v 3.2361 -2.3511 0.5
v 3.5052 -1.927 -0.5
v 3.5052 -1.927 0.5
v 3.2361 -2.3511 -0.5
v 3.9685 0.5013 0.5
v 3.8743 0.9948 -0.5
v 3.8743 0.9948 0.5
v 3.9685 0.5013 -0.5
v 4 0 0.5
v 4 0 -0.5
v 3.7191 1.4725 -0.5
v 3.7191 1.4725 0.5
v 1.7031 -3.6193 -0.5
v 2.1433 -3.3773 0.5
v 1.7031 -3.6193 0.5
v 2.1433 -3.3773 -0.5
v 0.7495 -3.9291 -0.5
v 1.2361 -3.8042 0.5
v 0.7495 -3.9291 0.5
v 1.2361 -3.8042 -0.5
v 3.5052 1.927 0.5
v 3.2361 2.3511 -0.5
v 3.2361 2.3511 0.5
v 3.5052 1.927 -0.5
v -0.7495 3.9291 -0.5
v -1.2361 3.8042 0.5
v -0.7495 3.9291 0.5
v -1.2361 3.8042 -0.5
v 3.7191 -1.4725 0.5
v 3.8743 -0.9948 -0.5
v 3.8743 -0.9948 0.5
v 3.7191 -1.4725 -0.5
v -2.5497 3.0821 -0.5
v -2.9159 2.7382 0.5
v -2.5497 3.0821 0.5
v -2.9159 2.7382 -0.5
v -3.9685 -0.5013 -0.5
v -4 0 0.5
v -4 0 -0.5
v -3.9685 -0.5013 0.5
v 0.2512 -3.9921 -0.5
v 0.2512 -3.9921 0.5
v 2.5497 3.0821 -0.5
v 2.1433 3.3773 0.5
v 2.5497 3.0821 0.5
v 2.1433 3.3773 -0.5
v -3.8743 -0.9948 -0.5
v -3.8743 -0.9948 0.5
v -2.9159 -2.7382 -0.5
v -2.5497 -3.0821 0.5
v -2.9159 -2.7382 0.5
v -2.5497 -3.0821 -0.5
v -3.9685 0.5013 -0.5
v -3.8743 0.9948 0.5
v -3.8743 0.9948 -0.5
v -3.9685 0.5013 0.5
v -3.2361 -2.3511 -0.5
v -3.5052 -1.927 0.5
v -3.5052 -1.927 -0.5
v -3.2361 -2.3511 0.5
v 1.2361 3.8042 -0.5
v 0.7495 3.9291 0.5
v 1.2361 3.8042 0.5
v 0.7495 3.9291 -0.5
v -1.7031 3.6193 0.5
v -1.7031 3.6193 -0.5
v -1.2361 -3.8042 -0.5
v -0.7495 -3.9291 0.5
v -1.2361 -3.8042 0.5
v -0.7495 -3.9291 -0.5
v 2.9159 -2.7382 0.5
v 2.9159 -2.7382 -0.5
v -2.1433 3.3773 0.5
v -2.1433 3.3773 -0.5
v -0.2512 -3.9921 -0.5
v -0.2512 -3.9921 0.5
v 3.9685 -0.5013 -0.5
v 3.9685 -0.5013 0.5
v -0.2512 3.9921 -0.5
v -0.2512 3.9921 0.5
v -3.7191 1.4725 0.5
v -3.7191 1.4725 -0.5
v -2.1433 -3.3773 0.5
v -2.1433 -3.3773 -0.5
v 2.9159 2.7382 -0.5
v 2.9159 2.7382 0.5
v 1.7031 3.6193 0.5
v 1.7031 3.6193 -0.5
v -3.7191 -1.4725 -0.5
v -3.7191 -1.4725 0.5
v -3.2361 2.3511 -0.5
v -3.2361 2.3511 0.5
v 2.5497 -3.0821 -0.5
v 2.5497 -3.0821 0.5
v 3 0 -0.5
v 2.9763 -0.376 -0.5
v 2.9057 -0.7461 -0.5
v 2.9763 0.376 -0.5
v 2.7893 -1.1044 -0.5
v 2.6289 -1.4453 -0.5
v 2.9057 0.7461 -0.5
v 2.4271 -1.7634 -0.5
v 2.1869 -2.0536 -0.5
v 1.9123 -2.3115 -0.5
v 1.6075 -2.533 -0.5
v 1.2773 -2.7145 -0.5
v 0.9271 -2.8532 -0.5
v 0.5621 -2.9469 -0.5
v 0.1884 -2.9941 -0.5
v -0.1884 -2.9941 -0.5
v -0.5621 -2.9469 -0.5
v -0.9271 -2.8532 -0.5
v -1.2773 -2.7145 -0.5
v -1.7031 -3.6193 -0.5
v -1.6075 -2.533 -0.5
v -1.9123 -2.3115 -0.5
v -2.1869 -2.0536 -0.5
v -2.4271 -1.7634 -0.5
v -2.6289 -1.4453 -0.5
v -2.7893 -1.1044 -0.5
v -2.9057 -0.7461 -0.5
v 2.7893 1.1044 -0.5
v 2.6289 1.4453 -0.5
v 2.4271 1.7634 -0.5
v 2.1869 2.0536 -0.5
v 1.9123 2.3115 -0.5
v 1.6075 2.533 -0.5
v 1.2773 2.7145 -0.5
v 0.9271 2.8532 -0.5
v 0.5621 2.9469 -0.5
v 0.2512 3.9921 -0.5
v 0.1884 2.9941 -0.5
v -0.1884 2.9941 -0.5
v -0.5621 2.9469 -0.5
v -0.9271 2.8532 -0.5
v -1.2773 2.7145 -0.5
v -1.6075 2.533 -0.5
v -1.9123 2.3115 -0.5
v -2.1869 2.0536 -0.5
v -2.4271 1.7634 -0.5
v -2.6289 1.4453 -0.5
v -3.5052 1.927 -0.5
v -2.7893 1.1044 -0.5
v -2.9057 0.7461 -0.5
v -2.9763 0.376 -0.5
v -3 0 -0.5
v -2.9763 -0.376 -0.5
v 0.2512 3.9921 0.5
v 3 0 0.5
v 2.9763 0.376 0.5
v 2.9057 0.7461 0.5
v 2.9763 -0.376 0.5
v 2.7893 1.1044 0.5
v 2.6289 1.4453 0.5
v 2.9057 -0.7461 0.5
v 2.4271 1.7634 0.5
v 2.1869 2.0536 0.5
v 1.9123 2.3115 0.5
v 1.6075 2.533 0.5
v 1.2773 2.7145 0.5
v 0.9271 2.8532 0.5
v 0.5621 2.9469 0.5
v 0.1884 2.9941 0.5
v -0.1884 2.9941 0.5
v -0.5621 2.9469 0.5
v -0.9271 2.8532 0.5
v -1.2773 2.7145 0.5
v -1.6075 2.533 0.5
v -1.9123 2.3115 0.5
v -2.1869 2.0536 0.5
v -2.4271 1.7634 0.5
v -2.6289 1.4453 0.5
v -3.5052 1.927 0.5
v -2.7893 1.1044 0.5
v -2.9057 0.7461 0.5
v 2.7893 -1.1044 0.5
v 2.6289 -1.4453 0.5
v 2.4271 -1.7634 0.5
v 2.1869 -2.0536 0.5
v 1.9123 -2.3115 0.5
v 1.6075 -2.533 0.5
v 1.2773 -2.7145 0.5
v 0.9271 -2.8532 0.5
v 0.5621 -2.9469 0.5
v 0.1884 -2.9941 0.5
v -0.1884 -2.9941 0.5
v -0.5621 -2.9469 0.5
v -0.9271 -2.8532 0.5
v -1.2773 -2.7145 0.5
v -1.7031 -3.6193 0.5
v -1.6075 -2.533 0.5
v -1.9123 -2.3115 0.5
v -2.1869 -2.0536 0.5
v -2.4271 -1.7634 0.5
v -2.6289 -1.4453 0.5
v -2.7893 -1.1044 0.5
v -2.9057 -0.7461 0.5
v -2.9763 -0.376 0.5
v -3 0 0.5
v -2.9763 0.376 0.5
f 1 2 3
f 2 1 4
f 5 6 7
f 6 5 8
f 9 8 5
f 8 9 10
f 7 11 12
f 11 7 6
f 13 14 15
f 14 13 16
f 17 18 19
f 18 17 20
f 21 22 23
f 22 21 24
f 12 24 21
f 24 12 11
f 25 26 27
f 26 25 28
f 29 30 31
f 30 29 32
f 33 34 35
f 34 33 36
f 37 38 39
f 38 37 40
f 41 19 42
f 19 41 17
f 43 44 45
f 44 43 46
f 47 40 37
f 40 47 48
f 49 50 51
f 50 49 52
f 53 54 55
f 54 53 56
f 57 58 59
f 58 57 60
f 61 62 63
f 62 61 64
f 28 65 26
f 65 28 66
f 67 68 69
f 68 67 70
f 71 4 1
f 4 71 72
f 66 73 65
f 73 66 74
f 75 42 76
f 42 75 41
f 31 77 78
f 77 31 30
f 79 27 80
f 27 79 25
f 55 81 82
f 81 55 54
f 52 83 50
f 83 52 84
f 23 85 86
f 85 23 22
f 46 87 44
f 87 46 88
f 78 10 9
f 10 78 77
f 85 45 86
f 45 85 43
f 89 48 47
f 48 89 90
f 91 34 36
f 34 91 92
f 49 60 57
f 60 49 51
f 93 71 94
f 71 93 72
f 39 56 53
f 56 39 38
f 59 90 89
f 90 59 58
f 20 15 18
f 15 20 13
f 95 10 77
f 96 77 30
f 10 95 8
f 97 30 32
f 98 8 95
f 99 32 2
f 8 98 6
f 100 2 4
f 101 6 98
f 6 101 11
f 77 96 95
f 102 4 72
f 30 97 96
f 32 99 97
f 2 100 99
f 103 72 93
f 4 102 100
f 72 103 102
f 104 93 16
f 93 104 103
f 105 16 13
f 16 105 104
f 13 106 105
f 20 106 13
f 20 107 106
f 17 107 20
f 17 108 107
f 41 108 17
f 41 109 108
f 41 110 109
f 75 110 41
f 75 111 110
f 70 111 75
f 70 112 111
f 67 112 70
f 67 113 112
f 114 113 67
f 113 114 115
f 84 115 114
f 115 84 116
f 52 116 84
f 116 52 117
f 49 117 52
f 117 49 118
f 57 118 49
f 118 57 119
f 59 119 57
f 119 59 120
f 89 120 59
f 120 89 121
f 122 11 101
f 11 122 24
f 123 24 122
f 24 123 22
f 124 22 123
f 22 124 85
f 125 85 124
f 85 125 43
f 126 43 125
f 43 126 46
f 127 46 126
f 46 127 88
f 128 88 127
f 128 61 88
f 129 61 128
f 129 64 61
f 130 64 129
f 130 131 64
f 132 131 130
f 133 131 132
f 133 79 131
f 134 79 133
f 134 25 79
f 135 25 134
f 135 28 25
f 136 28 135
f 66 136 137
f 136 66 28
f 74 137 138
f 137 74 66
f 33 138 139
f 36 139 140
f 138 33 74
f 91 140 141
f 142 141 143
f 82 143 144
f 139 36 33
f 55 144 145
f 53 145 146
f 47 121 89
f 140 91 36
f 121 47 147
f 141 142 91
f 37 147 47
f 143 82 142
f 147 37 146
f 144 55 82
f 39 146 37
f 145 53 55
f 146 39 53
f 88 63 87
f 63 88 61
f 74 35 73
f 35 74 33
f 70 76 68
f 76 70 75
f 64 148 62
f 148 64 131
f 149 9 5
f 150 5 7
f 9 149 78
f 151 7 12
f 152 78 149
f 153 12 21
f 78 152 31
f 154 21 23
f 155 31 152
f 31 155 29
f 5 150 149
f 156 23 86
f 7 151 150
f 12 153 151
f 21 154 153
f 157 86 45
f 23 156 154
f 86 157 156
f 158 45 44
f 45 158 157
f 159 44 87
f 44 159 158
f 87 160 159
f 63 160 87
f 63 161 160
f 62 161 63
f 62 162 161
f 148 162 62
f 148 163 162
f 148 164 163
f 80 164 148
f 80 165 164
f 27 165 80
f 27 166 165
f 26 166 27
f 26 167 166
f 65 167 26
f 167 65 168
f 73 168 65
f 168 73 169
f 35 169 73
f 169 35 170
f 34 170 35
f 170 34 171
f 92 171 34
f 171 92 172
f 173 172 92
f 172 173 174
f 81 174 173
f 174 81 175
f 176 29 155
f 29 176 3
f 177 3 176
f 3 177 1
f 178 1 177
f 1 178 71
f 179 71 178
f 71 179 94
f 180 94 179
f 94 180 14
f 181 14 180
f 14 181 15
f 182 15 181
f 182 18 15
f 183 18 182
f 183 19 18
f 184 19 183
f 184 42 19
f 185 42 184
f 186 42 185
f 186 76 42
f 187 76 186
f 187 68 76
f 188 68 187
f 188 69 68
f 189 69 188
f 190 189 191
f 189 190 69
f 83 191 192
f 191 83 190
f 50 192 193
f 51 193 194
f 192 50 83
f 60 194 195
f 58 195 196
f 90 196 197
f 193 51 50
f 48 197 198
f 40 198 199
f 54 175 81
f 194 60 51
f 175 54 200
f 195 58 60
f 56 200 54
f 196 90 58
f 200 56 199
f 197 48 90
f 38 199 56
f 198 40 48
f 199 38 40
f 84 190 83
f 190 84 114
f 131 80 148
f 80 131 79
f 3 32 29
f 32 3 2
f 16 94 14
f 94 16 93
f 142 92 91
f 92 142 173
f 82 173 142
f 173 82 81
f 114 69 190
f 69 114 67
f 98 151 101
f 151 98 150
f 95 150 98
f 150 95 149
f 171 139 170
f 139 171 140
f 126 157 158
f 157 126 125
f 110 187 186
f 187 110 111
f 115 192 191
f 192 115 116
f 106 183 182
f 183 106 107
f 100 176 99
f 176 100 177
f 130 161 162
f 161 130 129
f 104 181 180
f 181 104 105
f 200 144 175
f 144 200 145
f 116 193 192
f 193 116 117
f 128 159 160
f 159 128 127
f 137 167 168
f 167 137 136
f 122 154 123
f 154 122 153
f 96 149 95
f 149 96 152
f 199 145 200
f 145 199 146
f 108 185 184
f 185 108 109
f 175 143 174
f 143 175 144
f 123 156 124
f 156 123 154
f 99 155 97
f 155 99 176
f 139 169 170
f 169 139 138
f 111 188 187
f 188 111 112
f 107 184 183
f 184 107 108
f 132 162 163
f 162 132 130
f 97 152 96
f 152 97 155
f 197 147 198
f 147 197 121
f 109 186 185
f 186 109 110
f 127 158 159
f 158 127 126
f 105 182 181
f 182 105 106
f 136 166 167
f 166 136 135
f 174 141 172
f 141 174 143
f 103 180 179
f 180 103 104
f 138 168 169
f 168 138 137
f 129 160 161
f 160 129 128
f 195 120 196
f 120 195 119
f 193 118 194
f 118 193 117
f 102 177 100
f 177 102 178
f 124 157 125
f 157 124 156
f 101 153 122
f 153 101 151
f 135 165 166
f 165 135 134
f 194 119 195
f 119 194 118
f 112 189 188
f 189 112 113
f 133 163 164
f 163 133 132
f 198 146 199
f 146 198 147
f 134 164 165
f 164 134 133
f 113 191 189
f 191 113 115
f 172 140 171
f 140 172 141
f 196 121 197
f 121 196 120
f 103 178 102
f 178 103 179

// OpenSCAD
$fn = 50;


difference() {
	union() {
		translate(v = [0, 0, -0.5000000000]) {
			cylinder(h = 1, r = 4.0000000000);
		}
	}
	union() {
		translate(v = [0, 0, -100.0000000000]) {
			cylinder(h = 200, r = 3.0000000000);
		}
	}
}
